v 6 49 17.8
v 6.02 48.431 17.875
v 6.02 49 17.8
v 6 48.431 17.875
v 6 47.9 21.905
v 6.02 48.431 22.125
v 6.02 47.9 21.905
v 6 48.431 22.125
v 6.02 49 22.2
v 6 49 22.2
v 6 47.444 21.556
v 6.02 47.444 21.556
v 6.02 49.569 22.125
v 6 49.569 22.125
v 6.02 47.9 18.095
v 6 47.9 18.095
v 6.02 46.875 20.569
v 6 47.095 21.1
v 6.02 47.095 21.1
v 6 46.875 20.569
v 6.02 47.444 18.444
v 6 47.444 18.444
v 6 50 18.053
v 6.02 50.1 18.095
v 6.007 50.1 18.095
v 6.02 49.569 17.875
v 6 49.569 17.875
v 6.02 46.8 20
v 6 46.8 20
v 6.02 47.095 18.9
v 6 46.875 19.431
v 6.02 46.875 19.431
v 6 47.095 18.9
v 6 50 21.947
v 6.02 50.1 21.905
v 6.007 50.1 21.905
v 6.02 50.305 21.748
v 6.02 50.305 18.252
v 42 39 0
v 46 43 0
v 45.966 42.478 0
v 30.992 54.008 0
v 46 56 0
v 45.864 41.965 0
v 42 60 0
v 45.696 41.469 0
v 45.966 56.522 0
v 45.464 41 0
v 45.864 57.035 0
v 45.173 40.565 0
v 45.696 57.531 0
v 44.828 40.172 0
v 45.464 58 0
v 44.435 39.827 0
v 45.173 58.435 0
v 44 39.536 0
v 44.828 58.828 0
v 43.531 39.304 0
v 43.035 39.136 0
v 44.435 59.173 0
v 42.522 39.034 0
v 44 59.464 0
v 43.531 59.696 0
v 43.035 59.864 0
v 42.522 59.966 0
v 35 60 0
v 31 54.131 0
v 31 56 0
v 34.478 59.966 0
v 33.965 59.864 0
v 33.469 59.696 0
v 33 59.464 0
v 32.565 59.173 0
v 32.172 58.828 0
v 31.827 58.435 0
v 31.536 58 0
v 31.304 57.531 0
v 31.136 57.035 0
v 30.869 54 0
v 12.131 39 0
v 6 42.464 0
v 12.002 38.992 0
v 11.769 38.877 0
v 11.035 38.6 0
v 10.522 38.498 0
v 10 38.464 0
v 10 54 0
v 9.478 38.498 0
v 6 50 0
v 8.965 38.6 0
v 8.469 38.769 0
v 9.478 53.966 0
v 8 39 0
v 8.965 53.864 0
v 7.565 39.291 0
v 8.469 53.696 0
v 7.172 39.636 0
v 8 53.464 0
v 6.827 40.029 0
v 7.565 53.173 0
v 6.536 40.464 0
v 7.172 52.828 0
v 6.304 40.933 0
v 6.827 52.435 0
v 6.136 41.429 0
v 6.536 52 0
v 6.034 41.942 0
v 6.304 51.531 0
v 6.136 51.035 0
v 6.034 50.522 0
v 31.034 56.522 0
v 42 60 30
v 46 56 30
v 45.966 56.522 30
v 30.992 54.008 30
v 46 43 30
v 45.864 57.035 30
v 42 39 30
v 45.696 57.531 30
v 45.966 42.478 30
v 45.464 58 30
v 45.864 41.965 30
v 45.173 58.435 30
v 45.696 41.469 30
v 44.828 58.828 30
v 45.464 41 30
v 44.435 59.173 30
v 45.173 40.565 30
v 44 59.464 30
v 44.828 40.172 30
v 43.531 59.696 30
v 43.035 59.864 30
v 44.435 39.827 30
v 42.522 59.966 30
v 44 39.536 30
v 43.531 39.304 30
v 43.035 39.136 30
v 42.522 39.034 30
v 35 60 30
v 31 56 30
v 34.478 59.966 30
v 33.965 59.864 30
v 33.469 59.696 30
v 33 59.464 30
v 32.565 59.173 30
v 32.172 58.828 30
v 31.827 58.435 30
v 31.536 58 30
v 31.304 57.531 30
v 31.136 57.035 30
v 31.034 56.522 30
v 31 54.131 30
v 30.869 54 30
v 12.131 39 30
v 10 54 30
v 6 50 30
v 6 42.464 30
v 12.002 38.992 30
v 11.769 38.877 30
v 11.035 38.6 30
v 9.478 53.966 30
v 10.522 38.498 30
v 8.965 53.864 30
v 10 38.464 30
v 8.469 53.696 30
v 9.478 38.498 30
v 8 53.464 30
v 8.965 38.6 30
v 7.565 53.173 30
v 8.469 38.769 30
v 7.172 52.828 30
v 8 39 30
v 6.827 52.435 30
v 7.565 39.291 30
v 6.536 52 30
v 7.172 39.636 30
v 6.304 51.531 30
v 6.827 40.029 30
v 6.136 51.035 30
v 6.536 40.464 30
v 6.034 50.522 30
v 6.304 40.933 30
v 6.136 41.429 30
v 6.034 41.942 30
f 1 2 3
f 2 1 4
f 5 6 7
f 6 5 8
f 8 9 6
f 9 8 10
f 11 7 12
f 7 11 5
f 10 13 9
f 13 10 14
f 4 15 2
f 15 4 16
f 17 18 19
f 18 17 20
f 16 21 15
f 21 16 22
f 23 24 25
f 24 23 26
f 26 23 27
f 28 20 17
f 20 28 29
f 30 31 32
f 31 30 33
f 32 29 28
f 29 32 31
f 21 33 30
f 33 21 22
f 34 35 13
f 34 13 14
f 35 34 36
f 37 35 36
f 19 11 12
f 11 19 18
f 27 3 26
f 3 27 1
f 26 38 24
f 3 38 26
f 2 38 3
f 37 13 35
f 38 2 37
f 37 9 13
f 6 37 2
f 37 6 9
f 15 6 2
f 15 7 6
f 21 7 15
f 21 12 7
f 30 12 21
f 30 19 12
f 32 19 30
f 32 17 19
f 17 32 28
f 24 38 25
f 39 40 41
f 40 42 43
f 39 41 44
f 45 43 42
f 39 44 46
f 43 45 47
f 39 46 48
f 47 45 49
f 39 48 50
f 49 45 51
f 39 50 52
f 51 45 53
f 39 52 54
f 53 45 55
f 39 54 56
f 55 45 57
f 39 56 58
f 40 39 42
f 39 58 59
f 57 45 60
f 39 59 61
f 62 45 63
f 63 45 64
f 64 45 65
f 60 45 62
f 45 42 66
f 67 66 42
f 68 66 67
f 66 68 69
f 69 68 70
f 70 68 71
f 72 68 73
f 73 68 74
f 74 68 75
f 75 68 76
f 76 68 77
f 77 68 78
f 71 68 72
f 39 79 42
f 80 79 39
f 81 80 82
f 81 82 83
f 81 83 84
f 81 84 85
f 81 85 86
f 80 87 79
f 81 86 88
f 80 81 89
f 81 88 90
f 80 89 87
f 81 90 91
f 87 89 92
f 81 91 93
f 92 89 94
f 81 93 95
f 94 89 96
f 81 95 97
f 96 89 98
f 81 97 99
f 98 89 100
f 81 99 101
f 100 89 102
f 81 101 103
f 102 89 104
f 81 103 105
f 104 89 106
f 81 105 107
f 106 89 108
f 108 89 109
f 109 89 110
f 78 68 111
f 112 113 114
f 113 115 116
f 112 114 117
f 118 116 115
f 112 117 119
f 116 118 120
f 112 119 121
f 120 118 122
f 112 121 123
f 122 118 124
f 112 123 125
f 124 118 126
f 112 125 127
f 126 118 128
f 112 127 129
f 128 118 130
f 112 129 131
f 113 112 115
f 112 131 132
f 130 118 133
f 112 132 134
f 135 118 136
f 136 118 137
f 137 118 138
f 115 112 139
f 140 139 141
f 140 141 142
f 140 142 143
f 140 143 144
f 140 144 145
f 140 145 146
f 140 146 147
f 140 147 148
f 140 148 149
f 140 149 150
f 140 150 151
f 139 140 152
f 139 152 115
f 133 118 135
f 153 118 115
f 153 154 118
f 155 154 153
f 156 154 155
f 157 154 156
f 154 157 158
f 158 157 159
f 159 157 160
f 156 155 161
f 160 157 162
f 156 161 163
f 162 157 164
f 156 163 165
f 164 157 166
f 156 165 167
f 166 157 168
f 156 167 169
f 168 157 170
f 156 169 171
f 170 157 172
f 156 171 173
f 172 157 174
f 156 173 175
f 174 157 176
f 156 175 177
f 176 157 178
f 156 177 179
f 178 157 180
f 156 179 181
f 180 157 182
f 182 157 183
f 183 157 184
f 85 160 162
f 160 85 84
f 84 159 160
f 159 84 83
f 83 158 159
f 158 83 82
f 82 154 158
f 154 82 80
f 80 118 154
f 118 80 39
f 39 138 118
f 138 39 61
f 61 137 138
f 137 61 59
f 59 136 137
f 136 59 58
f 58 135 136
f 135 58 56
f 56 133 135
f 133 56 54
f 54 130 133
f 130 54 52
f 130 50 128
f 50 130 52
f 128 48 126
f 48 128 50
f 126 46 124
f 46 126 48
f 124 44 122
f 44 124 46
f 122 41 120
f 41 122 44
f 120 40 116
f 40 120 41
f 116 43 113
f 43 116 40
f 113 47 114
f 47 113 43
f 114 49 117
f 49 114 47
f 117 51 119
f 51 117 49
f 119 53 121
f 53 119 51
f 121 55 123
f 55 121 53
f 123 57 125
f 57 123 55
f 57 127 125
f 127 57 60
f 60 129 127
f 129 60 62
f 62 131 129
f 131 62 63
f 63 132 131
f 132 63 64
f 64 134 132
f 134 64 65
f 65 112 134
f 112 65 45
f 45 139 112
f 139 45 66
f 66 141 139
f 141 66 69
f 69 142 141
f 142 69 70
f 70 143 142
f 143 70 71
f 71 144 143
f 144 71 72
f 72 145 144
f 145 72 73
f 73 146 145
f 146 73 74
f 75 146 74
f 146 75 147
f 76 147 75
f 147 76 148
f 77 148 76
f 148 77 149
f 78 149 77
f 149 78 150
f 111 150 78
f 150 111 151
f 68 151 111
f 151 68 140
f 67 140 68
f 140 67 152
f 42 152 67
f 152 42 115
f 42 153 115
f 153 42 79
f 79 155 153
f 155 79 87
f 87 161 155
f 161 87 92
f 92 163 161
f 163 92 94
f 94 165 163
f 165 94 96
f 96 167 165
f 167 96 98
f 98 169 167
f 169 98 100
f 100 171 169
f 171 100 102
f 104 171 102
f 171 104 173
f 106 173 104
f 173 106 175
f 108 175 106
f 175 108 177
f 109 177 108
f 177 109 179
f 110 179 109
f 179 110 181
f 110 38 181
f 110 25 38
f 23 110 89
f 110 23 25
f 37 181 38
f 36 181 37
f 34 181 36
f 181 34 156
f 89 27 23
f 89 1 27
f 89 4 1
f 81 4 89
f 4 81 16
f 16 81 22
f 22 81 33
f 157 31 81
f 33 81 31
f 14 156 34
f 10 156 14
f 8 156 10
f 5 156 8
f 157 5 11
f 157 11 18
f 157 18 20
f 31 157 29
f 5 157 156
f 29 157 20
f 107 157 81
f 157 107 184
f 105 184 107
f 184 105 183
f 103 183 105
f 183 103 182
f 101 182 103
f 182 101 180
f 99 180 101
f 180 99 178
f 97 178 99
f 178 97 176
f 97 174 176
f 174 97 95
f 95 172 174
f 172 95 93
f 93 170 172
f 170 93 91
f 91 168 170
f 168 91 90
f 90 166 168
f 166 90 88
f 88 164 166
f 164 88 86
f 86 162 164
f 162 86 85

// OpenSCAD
// ============================================
// PARAMETRIC WALL HOOK
// Sturdy hook for coats, bags, or towels
// ============================================

/* [Hook Dimensions] */
hook_width = 30;        // Width of hook
hook_depth = 40;        // How far hook extends from wall
hook_upturn = 15;       // Upturn height to retain items
hook_thickness = 6;     // Material thickness

/* [Back Plate] */
back_height = 60;       // Total height of back plate
corner_radius = 4;      // Rounding on edges

/* [Mounting] */
screw_size = 4;         // Screw size (M3, M4, M5, etc.)
screw_count = 2;        // Number of mounting screws
countersink = true;     // Use countersunk screws

/* [Hidden] */
$fn = $preview ? 24 : 48;
epsilon = 0.01;

// ============================================
// VALIDATION
// ============================================

assert(hook_thickness >= 4, "Hook thickness should be at least 4mm for strength");
assert(hook_depth >= 25, "Hook depth should be at least 25mm to retain items");
assert(back_height >= hook_depth + 20, "Back plate must be taller than hook depth");
assert(screw_count >= 1 && screw_count <= 4, "Screw count should be 1-4");

// ============================================
// CALCULATED VALUES
// ============================================

// Screw hole positions
screw_spacing = (back_height - 20) / max(screw_count - 1, 1);
screw_start = back_height * 0.15;

// Profile points for 2D hook shape
inner_corner_r = max(corner_radius - 1, 1);

// ============================================
// MODULES
// ============================================

module hook_2d_profile() {
    // Create 2D profile with rounded corners
    offset(r = corner_radius) offset(r = -corner_radius)
    polygon([
        // Back plate (bottom-left, going clockwise)
        [0, 0],
        [hook_thickness, 0],
        // Up the back
        [hook_thickness, back_height - hook_thickness],
        // Out to hook
        [hook_thickness + hook_depth - hook_upturn, back_height - hook_thickness],
        // Upturn
        [hook_thickness + hook_depth - hook_upturn, back_height],
        [hook_thickness + hook_depth, back_height],
        // Down the front of upturn
        [hook_thickness + hook_depth, back_height - hook_thickness - hook_upturn],
        // Back along bottom of hook
        [hook_thickness * 2, back_height - hook_thickness - hook_upturn],
        // Down inside of back plate
        [hook_thickness * 2, hook_thickness],
        // Along bottom inside
        [0, hook_thickness]
    ]);
}

module screw_hole(depth) {
    if (countersink) {
        // Countersunk hole
        cs_d = screw_size * 2 + 0.5;
        hole_d = screw_size + 0.4;
        cs_depth = (cs_d - hole_d) / 2;

        // Through hole
        cylinder(h = depth + epsilon, d = hole_d, $fn = 24);

        // Countersink
        cylinder(h = cs_depth + epsilon, d1 = cs_d, d2 = hole_d, $fn = 32);
    } else {
        // Clearance hole only
        cylinder(h = depth + epsilon, d = screw_size + 0.4, $fn = 24);
    }
}

module wall_hook() {
    difference() {
        // Main hook body
        linear_extrude(hook_width)
            hook_2d_profile();

        // Mounting holes
        for (i = [0 : screw_count - 1]) {
            hole_z = hook_width * (i + 1) / (screw_count + 1);
            hole_y = screw_start + (screw_count > 1 ? i * screw_spacing : back_height/2 - screw_start);

            translate([0, hole_y, hole_z])
                rotate([0, 90, 0])
                rotate([0, 0, 180])
                screw_hole(hook_thickness + epsilon);
        }
    }
}

// ============================================
// RENDER
// ============================================

color("DarkSlateGray")
wall_hook();

// ============================================
// INFO OUTPUT
// ============================================

echo(str("=== Wall Hook ==="));
echo(str("Size: ", hook_width, " × ", hook_depth, " × ", back_height, " mm"));
echo(str("Material thickness: ", hook_thickness, " mm"));
echo(str("Mounting: ", screw_count, " × M", screw_size, " screws"));
echo(str("Countersunk: ", countersink));
